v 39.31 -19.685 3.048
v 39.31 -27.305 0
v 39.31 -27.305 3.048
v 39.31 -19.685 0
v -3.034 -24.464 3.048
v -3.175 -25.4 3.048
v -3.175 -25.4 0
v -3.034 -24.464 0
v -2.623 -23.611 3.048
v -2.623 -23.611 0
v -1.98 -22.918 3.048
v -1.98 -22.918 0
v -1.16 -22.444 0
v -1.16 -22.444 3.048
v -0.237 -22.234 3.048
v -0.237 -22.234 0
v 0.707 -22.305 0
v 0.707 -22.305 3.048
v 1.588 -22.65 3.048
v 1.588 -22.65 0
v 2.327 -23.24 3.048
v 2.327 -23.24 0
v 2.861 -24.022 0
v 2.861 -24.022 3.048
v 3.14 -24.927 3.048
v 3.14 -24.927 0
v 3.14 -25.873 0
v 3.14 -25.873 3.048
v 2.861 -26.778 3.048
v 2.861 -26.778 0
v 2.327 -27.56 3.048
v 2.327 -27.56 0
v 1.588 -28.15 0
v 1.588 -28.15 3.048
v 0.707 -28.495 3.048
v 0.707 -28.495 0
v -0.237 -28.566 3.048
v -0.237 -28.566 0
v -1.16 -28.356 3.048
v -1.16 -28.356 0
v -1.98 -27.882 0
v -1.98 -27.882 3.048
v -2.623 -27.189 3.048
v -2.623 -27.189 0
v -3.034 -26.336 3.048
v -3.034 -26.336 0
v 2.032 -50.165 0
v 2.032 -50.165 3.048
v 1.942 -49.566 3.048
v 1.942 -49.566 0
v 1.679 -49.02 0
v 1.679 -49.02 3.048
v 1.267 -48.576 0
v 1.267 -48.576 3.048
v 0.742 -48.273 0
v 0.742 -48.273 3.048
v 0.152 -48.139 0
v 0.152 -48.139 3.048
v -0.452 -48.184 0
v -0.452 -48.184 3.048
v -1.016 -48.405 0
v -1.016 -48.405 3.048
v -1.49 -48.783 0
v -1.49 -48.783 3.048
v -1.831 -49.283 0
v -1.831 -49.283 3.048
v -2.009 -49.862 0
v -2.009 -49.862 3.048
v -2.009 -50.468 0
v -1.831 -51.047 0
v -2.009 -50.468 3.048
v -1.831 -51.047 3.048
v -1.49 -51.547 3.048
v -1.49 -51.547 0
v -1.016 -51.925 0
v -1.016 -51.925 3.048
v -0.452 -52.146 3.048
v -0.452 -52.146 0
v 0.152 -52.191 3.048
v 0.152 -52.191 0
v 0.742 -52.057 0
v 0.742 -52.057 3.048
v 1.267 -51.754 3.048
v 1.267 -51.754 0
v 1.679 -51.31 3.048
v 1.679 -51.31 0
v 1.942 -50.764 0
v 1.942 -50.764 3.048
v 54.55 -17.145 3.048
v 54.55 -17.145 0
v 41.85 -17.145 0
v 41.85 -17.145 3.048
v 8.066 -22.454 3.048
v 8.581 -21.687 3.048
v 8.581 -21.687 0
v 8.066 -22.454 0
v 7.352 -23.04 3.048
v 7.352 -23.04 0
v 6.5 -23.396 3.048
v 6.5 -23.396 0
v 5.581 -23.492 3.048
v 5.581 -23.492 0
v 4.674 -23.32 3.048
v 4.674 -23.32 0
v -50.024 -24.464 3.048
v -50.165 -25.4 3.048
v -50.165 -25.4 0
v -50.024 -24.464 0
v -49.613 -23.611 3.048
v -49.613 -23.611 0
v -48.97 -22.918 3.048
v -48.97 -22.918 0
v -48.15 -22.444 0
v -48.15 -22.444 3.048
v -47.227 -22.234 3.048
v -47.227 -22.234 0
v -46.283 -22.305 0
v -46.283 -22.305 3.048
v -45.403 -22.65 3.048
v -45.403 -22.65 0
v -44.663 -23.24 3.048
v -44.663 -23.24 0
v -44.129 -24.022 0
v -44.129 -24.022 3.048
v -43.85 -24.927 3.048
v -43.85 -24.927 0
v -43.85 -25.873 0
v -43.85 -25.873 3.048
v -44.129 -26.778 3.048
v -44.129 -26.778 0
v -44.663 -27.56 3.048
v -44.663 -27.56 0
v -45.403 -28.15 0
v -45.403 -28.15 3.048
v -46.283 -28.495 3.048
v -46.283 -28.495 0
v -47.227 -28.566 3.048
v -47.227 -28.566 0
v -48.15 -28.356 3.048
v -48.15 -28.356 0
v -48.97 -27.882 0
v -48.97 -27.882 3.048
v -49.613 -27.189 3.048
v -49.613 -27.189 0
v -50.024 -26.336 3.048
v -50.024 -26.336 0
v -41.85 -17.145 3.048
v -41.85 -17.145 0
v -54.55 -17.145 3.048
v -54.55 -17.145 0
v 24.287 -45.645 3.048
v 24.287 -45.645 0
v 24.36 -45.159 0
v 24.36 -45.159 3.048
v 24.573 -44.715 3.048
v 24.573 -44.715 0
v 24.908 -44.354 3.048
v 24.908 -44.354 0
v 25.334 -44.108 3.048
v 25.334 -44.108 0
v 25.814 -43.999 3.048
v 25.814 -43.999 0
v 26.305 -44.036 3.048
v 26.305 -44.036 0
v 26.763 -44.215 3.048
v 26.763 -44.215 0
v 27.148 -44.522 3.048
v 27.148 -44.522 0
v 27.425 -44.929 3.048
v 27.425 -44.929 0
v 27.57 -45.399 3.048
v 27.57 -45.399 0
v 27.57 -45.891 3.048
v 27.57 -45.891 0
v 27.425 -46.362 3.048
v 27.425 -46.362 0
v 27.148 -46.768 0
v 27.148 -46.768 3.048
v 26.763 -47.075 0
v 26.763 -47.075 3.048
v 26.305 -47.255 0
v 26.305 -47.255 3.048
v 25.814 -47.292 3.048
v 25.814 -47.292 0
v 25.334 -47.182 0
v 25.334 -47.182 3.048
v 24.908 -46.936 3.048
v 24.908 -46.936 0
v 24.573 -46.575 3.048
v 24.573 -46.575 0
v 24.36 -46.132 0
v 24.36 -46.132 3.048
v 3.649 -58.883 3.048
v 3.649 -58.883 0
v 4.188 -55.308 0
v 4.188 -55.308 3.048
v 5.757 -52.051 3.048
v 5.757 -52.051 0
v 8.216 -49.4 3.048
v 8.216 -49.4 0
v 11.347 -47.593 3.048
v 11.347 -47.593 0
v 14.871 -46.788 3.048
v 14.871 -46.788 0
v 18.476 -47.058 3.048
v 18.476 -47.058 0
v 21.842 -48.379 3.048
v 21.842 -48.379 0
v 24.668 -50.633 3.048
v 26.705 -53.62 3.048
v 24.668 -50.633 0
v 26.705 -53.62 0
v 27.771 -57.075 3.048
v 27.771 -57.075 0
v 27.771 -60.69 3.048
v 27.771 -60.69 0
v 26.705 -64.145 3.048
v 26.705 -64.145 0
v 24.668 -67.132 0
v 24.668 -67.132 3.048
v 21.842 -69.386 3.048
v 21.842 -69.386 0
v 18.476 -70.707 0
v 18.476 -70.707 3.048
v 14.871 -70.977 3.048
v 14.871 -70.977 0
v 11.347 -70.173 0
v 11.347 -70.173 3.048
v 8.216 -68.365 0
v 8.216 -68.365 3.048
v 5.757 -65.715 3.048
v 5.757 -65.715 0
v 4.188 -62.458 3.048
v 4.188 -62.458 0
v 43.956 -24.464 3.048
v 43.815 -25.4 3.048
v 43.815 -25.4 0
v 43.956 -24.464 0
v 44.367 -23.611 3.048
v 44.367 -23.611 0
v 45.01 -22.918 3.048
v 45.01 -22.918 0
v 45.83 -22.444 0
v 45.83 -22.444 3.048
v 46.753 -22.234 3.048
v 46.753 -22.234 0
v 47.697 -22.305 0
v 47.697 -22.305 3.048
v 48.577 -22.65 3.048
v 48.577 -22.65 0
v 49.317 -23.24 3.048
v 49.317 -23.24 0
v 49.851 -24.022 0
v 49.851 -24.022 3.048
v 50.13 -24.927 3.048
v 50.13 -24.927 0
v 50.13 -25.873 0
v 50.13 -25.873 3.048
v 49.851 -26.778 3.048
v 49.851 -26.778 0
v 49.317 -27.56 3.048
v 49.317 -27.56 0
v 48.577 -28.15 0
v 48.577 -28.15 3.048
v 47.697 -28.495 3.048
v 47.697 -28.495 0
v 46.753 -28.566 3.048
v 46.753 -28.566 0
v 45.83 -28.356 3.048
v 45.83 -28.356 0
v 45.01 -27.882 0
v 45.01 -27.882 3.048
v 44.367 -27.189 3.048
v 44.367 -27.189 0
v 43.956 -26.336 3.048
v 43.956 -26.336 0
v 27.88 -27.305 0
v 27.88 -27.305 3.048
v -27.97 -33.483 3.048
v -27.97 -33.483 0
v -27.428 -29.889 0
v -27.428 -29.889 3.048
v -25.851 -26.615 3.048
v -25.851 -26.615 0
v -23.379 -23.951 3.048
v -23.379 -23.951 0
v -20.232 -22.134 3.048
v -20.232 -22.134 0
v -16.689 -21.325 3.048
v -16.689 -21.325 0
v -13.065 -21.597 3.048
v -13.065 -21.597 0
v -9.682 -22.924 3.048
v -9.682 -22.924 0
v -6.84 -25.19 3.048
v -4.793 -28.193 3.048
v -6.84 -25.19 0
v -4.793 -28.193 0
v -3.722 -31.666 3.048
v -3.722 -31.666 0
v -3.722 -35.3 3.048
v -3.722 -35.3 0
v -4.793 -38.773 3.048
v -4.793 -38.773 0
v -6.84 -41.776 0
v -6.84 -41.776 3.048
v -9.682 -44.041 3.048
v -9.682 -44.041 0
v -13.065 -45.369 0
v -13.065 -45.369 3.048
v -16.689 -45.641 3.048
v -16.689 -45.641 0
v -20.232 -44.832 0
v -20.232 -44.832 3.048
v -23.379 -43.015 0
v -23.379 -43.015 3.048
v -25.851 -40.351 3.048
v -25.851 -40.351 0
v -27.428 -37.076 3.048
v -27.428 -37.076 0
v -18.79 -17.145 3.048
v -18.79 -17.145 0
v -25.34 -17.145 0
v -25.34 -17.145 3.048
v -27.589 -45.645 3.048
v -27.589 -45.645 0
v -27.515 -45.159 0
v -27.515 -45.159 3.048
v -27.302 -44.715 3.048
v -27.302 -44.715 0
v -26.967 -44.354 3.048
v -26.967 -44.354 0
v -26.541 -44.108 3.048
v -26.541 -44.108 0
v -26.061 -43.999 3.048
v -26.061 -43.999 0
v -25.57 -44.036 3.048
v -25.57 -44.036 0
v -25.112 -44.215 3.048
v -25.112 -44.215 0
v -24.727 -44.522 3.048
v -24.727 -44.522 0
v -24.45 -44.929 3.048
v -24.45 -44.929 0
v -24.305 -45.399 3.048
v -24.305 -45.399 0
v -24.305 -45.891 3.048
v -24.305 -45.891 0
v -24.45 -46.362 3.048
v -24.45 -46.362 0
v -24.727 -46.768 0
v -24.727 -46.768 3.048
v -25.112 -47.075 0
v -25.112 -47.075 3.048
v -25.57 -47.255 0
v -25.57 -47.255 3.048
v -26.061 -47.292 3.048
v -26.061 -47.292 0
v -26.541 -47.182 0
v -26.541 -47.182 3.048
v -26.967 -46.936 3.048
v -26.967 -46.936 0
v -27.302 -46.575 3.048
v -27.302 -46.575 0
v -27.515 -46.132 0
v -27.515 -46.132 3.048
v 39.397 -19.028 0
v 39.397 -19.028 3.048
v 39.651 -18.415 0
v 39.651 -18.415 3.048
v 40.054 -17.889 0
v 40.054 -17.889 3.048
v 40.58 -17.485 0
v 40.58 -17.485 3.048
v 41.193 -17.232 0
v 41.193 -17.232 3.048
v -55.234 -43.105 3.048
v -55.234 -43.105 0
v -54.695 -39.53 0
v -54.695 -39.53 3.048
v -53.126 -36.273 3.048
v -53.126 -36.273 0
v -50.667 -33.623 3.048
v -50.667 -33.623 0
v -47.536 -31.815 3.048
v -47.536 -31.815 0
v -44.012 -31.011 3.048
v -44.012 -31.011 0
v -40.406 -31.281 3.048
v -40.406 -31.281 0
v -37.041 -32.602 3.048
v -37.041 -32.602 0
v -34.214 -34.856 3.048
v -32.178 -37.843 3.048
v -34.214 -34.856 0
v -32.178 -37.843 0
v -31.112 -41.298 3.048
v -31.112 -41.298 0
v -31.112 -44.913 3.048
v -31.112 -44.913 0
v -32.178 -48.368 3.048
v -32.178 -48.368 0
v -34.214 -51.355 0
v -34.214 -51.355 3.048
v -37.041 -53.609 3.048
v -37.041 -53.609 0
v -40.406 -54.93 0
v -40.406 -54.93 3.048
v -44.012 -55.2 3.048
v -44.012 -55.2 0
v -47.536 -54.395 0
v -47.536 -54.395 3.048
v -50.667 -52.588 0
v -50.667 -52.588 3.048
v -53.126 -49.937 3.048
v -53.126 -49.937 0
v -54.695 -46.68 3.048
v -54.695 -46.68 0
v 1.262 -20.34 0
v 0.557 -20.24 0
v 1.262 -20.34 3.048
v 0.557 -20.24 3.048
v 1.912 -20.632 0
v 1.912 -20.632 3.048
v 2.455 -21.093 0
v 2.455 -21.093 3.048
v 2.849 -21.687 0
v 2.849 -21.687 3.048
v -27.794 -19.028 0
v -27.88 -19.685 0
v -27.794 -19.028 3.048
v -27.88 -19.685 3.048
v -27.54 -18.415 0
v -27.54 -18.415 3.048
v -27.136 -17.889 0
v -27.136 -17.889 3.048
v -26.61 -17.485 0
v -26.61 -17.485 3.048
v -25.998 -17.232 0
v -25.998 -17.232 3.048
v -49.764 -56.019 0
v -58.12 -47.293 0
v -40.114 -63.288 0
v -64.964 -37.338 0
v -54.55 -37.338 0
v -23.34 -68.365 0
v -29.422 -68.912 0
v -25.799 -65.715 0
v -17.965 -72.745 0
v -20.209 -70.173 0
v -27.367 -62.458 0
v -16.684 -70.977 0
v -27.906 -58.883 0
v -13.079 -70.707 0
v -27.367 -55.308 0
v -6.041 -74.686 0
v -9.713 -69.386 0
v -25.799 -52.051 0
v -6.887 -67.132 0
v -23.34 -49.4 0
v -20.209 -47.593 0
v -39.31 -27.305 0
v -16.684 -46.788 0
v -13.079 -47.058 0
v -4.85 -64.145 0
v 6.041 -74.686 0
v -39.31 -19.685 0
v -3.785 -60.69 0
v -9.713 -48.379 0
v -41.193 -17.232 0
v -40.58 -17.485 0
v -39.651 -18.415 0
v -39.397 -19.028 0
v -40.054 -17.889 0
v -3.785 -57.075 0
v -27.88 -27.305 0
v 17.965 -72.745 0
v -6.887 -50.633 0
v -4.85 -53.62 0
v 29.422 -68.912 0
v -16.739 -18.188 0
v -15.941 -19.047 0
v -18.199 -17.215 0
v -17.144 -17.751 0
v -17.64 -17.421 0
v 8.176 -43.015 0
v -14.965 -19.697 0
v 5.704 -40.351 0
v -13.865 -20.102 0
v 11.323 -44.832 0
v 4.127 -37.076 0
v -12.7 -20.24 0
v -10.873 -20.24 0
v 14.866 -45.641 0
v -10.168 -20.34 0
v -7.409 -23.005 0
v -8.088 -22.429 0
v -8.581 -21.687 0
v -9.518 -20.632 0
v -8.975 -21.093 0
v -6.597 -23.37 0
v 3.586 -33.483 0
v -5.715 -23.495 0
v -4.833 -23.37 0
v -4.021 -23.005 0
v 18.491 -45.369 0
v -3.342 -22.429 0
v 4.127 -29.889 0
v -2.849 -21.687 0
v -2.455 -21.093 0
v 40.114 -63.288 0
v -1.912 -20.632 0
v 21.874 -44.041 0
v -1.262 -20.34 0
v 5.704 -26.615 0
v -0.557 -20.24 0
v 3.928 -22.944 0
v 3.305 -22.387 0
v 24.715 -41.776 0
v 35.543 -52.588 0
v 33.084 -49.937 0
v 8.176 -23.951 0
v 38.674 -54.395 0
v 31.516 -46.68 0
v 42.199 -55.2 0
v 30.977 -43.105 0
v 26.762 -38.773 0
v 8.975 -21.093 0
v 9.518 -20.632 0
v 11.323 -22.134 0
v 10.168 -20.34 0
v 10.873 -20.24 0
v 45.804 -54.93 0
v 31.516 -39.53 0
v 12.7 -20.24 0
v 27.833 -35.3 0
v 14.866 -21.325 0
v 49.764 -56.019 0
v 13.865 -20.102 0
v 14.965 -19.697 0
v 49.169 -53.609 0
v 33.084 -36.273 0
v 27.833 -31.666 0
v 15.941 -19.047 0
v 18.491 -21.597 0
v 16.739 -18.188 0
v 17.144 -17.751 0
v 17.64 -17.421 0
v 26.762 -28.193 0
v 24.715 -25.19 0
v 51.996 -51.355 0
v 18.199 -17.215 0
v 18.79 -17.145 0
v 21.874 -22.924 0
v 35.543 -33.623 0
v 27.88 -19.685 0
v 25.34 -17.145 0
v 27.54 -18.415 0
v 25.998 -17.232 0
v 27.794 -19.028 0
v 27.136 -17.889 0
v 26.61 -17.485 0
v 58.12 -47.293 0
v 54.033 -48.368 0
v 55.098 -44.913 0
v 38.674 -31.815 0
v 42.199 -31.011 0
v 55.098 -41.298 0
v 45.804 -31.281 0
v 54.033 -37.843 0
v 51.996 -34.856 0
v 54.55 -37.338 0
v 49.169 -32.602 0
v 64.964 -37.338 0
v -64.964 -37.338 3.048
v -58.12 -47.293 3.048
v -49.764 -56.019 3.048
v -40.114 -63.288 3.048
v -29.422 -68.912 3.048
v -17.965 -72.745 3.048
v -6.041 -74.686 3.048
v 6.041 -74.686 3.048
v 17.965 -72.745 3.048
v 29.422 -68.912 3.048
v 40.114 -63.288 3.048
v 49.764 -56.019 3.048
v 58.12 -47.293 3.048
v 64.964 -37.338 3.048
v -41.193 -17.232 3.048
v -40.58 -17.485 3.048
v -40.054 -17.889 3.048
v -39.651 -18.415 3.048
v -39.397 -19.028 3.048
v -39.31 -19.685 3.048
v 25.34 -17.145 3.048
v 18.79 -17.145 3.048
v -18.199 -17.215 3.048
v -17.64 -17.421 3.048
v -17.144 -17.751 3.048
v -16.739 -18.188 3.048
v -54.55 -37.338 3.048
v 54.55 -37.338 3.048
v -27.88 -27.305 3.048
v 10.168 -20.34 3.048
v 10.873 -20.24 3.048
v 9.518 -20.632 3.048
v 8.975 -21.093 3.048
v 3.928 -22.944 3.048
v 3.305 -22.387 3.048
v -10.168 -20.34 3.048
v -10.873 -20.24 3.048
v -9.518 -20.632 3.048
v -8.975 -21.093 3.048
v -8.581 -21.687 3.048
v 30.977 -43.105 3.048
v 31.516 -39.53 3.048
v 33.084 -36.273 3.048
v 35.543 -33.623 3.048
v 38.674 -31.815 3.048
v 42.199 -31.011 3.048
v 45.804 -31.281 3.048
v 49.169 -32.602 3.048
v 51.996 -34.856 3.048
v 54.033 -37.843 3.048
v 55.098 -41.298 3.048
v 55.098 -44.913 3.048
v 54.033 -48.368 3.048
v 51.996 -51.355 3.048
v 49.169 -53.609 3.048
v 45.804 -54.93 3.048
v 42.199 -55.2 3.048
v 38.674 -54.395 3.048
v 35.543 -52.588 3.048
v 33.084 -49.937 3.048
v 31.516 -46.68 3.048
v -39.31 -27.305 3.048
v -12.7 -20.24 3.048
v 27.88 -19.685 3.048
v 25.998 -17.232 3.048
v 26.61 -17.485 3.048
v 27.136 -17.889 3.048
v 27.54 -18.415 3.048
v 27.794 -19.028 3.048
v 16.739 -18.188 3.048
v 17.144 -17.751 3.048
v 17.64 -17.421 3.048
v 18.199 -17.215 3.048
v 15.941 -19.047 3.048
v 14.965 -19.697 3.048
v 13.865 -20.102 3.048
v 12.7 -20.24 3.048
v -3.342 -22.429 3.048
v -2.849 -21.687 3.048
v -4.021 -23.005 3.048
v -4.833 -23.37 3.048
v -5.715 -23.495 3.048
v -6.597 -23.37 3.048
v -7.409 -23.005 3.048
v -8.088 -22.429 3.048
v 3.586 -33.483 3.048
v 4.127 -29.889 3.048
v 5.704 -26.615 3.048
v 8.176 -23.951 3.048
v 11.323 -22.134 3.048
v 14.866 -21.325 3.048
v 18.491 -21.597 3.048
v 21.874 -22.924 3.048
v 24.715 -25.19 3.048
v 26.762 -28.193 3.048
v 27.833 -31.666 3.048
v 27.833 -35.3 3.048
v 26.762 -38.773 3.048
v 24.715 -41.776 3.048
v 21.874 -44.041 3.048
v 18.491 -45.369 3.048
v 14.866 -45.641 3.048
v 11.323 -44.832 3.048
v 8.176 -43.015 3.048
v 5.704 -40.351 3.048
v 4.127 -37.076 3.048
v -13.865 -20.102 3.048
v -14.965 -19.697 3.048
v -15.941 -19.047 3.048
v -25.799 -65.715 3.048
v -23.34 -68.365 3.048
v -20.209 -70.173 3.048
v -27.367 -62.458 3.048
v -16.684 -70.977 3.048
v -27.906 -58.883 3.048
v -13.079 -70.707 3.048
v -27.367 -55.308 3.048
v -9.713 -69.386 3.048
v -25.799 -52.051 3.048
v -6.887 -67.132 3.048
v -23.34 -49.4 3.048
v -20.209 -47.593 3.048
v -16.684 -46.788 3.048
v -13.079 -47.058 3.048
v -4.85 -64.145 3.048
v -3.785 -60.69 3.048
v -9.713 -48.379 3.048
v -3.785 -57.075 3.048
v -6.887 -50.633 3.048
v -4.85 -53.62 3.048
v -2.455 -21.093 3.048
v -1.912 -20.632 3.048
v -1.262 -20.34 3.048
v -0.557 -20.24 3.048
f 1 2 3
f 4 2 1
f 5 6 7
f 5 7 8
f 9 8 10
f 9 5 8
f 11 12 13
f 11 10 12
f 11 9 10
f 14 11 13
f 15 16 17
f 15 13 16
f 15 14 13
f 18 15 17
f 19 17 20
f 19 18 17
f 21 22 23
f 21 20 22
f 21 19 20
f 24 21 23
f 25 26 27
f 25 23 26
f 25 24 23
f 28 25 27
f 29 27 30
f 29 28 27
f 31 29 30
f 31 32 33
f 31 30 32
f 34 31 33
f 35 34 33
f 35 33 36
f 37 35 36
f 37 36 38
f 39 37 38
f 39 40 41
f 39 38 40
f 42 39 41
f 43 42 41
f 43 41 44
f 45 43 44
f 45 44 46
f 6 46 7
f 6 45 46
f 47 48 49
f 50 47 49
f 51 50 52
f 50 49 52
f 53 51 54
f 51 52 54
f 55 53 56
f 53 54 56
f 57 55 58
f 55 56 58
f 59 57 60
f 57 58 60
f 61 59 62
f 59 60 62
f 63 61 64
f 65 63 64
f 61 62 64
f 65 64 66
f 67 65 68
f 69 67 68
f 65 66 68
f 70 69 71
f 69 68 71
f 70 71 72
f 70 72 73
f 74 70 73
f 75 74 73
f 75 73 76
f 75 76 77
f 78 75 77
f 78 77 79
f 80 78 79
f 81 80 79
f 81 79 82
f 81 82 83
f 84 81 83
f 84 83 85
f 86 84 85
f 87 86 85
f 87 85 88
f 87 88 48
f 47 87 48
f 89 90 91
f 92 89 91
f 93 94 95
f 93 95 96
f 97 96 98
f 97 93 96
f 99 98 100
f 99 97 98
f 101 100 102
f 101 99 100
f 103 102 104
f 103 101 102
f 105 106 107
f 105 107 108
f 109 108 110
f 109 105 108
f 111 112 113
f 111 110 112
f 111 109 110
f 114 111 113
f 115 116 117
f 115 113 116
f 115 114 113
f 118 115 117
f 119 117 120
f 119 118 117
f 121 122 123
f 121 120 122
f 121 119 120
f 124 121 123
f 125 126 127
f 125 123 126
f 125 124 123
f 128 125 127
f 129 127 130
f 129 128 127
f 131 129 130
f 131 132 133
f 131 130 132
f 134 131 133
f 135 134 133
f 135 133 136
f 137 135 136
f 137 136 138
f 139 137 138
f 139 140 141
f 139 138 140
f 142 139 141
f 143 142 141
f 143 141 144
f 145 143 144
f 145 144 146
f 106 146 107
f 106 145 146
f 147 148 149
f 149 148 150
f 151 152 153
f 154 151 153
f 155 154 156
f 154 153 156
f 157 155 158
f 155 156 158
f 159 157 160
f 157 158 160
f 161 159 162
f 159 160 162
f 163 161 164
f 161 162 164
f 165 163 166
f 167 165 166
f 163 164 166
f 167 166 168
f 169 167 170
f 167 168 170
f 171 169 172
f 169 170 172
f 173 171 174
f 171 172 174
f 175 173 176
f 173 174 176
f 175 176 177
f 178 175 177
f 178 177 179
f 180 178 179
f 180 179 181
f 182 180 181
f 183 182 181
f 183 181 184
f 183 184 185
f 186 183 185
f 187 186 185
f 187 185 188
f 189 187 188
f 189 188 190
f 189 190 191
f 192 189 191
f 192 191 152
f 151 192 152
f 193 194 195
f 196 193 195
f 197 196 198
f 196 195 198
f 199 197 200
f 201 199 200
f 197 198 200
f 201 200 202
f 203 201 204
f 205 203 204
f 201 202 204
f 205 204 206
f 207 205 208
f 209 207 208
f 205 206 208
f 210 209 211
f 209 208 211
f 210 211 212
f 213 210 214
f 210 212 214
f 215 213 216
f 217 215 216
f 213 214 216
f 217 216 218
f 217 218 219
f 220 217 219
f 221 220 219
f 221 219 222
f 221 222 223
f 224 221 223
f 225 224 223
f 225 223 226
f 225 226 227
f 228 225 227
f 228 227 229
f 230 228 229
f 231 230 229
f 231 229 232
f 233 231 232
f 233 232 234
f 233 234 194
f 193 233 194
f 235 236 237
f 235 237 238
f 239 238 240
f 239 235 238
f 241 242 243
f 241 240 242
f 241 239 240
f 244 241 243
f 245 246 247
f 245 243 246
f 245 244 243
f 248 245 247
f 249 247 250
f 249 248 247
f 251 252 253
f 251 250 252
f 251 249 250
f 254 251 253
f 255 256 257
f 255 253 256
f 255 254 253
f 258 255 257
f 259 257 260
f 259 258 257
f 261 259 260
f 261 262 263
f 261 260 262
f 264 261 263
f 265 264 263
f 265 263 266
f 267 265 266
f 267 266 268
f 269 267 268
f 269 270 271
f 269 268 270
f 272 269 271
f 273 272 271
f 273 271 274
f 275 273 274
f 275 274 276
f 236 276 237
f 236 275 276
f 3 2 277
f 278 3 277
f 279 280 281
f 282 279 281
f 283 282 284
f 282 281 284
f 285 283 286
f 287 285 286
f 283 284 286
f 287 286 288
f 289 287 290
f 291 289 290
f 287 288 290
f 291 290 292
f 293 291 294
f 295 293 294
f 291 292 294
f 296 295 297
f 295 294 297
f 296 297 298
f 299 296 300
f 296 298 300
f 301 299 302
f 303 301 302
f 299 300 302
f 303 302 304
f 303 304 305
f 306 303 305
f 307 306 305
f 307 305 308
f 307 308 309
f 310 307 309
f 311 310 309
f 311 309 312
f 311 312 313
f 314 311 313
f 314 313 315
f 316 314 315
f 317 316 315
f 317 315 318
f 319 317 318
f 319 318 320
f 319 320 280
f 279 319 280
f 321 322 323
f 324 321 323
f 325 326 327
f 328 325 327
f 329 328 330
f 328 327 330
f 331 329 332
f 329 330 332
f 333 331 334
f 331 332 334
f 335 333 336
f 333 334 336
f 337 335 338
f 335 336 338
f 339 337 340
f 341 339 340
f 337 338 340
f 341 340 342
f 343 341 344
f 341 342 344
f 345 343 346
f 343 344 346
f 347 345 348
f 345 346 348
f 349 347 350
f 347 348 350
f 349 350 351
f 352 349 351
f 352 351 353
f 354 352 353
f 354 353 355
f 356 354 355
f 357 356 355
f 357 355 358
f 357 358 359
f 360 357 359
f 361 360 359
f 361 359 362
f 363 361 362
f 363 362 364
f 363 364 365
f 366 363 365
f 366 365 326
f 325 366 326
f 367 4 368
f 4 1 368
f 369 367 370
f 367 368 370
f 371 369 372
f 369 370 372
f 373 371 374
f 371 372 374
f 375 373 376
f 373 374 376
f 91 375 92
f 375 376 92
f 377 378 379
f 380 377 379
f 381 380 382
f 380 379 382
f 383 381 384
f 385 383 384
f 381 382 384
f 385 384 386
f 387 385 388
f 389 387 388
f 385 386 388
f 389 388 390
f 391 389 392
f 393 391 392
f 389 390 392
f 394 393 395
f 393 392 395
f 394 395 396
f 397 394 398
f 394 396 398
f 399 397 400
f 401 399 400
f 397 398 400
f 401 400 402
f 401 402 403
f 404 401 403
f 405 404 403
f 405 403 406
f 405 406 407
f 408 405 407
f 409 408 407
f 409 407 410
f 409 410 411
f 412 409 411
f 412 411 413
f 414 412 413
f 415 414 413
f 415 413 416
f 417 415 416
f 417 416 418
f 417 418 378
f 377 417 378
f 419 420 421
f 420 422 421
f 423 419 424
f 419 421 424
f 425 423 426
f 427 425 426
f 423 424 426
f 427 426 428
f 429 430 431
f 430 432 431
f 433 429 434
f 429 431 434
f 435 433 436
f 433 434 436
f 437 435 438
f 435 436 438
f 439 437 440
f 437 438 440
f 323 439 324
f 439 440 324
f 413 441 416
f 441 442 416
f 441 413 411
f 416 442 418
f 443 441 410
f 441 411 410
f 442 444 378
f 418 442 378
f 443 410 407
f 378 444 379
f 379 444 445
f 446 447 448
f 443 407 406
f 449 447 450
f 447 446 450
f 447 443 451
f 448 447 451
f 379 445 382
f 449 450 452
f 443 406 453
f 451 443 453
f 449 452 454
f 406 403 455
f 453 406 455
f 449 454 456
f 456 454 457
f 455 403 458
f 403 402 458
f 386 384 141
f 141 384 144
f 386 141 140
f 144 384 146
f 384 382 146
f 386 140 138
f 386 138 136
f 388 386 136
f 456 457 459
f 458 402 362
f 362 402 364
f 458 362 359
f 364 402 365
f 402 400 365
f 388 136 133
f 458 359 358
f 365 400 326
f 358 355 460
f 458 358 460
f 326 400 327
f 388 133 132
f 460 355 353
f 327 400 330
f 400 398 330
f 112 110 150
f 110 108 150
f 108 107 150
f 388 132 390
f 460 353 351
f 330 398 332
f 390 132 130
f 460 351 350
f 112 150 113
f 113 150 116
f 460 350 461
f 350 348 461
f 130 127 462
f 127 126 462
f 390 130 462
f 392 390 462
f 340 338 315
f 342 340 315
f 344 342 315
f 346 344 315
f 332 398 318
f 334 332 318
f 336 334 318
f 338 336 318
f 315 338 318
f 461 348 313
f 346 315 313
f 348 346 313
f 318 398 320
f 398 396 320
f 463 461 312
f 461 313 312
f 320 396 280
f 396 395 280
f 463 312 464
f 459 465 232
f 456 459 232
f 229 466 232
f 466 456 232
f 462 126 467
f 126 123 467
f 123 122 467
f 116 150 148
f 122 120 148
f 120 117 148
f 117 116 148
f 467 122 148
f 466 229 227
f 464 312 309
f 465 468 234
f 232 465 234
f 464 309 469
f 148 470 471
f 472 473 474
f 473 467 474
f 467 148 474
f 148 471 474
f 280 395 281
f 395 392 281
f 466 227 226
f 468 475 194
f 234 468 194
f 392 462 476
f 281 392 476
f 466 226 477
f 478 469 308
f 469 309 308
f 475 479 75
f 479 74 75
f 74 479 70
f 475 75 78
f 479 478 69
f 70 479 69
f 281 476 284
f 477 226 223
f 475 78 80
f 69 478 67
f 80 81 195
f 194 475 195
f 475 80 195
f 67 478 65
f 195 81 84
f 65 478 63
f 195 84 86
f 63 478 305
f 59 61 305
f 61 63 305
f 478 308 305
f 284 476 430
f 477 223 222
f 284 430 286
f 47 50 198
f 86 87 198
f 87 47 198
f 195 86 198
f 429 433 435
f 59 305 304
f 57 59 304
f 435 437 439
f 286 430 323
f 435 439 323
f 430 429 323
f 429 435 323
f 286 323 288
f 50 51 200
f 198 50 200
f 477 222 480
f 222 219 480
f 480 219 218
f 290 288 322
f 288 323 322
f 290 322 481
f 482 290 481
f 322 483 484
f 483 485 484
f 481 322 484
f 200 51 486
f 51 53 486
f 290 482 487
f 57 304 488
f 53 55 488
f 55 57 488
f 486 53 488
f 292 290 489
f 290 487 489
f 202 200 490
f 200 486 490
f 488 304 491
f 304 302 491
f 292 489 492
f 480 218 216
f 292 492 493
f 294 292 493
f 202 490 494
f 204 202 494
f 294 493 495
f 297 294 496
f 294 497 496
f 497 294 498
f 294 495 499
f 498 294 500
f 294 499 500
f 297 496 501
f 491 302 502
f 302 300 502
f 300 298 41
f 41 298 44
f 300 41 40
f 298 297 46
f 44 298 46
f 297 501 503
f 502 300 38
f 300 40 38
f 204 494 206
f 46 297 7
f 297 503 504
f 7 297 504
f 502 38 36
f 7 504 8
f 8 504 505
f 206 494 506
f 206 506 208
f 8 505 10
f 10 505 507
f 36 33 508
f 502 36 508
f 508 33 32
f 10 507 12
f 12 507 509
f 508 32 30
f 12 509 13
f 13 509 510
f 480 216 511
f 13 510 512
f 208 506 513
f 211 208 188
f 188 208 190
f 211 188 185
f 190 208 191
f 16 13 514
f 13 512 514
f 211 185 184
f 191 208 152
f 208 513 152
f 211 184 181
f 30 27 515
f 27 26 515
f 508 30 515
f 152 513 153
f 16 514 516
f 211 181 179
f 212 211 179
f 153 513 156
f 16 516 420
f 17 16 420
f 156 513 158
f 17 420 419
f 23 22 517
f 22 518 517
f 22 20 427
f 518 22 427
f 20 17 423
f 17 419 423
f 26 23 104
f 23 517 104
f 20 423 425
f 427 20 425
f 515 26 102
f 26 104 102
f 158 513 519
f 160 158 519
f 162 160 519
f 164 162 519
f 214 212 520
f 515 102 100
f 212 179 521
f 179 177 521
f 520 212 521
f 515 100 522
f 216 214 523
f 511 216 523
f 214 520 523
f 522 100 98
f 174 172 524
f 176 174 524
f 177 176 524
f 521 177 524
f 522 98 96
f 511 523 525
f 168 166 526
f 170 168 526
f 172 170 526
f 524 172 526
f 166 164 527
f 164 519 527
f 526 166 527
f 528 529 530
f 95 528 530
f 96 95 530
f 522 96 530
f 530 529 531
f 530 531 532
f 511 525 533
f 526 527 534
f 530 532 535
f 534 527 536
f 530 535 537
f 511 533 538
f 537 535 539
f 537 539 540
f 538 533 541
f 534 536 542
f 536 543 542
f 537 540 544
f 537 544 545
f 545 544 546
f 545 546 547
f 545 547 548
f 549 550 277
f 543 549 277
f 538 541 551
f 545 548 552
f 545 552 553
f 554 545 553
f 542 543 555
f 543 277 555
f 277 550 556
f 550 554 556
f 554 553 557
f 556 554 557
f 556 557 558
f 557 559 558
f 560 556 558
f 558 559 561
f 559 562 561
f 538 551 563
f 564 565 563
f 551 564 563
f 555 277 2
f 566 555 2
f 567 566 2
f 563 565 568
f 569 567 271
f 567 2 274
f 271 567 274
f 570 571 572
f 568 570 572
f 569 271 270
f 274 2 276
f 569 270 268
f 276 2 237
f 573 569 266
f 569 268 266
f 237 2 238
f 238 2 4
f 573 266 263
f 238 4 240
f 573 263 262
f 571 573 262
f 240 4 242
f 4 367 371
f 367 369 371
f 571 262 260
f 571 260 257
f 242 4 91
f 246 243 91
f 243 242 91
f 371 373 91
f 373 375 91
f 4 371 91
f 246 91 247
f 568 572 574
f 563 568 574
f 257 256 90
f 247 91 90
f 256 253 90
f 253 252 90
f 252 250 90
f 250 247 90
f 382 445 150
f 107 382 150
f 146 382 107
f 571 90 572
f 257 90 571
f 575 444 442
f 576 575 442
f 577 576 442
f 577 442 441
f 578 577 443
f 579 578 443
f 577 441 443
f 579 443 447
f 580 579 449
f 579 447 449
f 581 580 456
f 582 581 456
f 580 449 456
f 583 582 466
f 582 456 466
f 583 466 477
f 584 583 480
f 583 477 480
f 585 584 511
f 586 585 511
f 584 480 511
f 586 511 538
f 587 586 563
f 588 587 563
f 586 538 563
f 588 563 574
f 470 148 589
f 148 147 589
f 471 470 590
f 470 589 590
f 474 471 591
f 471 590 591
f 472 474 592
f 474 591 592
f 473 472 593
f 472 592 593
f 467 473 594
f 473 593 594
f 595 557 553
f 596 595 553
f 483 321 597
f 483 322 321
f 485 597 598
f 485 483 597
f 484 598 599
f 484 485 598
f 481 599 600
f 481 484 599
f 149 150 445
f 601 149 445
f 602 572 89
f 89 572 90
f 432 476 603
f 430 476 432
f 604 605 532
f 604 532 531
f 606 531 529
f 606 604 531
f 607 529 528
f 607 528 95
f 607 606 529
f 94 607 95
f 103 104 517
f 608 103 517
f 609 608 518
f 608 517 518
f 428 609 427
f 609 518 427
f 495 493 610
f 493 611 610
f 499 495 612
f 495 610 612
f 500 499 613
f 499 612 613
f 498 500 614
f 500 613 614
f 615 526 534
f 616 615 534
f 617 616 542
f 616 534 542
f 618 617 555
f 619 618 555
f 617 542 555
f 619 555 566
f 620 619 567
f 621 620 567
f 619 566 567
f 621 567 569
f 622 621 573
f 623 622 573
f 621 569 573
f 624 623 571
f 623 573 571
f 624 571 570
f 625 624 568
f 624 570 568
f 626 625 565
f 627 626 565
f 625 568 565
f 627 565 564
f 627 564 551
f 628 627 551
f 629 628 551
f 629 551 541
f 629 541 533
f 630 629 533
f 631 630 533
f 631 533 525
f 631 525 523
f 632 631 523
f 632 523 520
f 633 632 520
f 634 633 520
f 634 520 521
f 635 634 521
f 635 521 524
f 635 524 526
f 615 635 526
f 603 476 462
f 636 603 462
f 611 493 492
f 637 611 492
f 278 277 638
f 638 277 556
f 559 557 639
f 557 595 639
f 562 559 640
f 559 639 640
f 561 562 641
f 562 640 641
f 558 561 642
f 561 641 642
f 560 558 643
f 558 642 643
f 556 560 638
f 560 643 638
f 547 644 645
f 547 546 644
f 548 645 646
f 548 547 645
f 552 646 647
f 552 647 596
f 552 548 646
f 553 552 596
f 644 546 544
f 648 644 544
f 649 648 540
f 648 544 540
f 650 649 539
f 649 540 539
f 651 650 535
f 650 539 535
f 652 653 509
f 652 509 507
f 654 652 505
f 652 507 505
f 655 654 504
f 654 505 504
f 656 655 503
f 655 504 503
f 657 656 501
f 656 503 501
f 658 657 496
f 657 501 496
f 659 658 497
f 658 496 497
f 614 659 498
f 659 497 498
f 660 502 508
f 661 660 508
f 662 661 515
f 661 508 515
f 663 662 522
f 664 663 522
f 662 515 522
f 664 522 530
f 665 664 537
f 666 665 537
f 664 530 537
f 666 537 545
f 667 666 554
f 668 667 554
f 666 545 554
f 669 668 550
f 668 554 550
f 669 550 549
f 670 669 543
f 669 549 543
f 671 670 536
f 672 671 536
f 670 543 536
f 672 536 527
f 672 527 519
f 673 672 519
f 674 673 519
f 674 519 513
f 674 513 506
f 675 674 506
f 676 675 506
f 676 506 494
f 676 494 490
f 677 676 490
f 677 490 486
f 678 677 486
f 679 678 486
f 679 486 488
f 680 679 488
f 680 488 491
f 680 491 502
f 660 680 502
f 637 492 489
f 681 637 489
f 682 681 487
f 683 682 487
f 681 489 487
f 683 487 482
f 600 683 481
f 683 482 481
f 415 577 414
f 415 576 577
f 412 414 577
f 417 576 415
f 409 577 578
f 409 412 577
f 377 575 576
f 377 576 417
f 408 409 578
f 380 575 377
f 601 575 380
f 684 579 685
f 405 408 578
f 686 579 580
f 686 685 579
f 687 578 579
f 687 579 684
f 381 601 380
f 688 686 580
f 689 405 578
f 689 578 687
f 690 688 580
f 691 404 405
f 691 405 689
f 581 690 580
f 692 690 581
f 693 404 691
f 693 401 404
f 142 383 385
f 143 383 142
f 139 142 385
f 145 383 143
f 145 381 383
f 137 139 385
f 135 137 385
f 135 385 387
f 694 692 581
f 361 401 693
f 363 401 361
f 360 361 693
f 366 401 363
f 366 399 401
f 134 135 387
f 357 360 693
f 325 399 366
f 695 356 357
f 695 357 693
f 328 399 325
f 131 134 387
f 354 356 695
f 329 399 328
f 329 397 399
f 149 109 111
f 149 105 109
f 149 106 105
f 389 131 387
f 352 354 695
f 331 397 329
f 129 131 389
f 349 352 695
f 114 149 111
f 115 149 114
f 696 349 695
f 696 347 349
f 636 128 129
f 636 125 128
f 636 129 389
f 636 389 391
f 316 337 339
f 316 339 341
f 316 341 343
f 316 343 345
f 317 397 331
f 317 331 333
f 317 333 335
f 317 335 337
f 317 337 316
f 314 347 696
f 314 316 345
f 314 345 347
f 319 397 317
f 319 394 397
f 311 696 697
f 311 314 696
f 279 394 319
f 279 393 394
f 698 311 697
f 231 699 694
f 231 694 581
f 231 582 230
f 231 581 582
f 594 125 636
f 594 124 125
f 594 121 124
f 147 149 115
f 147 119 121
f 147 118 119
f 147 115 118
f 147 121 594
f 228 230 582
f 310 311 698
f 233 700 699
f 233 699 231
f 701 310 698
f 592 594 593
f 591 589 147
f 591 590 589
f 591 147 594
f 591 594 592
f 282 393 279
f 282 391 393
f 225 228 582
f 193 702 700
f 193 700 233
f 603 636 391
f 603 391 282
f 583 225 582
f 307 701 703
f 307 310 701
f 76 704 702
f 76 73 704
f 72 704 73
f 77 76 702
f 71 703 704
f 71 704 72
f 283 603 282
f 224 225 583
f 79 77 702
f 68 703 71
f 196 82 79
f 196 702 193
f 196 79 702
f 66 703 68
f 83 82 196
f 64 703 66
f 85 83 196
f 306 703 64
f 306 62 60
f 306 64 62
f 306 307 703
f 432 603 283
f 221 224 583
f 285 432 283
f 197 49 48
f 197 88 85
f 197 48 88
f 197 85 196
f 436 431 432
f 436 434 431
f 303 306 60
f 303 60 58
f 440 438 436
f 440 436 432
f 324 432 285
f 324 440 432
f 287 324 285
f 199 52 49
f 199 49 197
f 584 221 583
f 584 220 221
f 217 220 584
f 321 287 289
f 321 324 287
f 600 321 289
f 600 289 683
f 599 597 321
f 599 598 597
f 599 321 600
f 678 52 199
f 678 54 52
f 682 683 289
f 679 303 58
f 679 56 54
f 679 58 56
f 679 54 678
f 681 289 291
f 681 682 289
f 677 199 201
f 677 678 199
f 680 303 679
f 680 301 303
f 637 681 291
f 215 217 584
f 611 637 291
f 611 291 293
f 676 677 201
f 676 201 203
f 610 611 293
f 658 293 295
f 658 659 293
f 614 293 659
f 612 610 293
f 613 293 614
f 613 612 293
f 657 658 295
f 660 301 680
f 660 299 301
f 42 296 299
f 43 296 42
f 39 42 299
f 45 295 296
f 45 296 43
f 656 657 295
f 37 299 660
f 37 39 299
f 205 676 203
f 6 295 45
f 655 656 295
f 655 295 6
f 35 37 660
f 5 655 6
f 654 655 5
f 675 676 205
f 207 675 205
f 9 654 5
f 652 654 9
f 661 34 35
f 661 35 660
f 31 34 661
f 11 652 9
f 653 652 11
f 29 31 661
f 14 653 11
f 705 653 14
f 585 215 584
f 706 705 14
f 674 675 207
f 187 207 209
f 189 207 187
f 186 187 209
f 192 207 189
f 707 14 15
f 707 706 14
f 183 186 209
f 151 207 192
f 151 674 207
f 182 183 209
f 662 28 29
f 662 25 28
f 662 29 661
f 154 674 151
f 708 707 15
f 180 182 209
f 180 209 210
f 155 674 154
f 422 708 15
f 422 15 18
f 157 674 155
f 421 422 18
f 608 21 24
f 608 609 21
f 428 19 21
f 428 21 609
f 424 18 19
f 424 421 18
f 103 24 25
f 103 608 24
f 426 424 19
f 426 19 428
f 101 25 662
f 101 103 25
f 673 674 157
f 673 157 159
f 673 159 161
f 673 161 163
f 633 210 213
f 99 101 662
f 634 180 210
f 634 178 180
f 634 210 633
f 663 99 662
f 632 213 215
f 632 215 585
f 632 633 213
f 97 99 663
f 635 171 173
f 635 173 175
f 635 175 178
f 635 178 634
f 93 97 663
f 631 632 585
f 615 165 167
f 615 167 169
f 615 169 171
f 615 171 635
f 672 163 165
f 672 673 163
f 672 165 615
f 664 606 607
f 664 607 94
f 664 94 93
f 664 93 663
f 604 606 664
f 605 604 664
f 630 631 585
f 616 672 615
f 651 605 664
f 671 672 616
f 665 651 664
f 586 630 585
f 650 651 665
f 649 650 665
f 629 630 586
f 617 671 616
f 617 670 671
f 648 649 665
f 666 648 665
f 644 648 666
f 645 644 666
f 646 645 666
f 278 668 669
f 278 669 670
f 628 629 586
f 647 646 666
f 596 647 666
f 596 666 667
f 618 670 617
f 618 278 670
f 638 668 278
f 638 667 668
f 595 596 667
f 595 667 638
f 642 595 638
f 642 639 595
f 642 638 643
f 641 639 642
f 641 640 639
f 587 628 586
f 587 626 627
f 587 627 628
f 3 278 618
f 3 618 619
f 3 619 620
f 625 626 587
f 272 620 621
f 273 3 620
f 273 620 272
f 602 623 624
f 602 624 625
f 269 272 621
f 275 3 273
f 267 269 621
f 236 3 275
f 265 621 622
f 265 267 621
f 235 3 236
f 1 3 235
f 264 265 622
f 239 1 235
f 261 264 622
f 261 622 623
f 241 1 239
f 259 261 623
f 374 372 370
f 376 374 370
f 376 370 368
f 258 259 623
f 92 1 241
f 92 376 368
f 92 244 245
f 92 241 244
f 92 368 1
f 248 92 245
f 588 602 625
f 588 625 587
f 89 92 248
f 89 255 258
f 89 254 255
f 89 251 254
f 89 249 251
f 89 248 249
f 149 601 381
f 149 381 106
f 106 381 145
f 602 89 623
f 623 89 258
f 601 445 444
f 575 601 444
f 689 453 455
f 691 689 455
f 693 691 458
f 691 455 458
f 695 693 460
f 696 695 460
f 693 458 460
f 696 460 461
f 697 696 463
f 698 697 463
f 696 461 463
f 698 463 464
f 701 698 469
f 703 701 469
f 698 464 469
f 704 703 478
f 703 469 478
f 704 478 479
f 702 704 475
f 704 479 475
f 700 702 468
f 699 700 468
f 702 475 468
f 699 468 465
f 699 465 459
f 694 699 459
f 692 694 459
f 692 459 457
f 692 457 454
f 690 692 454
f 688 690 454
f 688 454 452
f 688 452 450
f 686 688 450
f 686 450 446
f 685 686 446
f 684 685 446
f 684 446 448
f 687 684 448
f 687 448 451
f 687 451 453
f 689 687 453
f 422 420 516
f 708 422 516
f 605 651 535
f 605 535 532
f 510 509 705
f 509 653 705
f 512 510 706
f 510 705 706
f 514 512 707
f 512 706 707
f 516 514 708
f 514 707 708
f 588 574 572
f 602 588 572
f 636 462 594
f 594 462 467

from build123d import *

# Parameters (mm, degrees)
SKETCH1_R                 = 1.651
BOSS_EXTRUDE2_DEPTH       = 3.048
SKETCH2_R                 = 1.143
CUT_EXTRUDE1_DEPTH        = 4.048
SKETCH3_R                 = 12.1285
CUT_EXTRUDE2_DEPTH        = 4.048
SKETCH4_W                 = 28.562713242
SKETCH4_H                 = 11.677503754
BOSS_EXTRUDE3_DEPTH       = 3.048
SKETCH5_W                 = 216.7214489
SKETCH5_H                 = 130.569220634
CUT_EXTRUDE4_DEPTH        = 4.048
SKETCH6_W                 = 4.7625
SKETCH6_H                 = 27.432
CUT_EXTRUDE5_DEPTH        = 4.048
SKETCH10_W                = 11.43
SKETCH10_H                = 10.16
CUT_EXTRUDE9_DEPTH        = 4.048
FILLET1_R                 = 6
FILLET2_R                 = 6
SKETCH66_R                = 1.651
CUT_EXTRUDE65_DEPTH       = 97.79
SKETCH120_R               = 3.175
CUT_EXTRUDE119_DEPTH      = 103.378
CUT_EXTRUDE119_DEPTH_BACK = 48.768
CUT_EXTRUDE12_DEPTH       = 10
FILLET3_R                 = 2.54
BOSS_EXTRUDE4_DEPTH       = 3.048
SKETCH122_R               = 2.032
CUT_EXTRUDE120_DEPTH      = 27.305
SKETCH123_R               = 12.192
CUT_EXTRUDE121_DEPTH      = 19.05


with BuildPart() as part:
    # Sketch1 → Boss-Extrude2 (new body)
    with BuildSketch(Plane.XY):
        with BuildLine():
            Line((-64.964441474, 37.338), (-54.550441474, 37.338))
            Line((-54.550441474, 37.338), (-54.550441474, -37.338))
            Line((-54.550441474, -37.338), (-64.964441474, -37.338))
            ThreePointArc((-64.964441474, -37.338), (0, -74.93), (64.964441474, -37.338))
            Line((64.964441474, -37.338), (54.550441474, -37.338))
            Line((54.550441474, -37.338), (54.550441474, 37.338))
            Line((54.550441474, 37.338), (64.964441474, 37.338))
            ThreePointArc((64.964441474, 37.338), (0, 74.93), (-64.964441474, 37.338))
        make_face()
        with Locations((-46.482, 11.049)):
            Circle(SKETCH1_R, mode=Mode.SUBTRACT)
        with Locations((-21.083270032, 10.795)):
            Circle(SKETCH1_R, mode=Mode.SUBTRACT)
        with Locations((-21.083270032, -10.795)):
            Circle(SKETCH1_R, mode=Mode.SUBTRACT)
        with Locations((-46.482, -11.049)):
            Circle(SKETCH1_R, mode=Mode.SUBTRACT)
        with Locations((46.482, -11.049)):
            Circle(SKETCH1_R, mode=Mode.SUBTRACT)
        with Locations((21.083270032, -10.795)):
            Circle(SKETCH1_R, mode=Mode.SUBTRACT)
        with Locations((21.083270032, 10.795)):
            Circle(SKETCH1_R, mode=Mode.SUBTRACT)
        with Locations((46.482, 11.049)):
            Circle(SKETCH1_R, mode=Mode.SUBTRACT)
    extrude(amount=BOSS_EXTRUDE2_DEPTH)

    # Sketch2 → Cut-Extrude1 (cut, through all)
    with BuildSketch(Plane.XY.offset(3.048)):
        with Locations((-6.731, 62.23)):
            Circle(SKETCH2_R)
        with Locations((6.731, 62.23)):
            Circle(SKETCH2_R)
    extrude(amount=-CUT_EXTRUDE1_DEPTH, mode=Mode.SUBTRACT)

    # Sketch3 → Cut-Extrude2 (cut, through all)
    with BuildSketch(Plane(origin=(0, 0, 0), x_dir=(-1, 0, 0), z_dir=(0, 0, -1))):
        with Locations((-15.777608989, -58.882838371)):
            Circle(SKETCH3_R)
        with Locations((15.777608989, -58.882838371)):
            Circle(SKETCH3_R)
        with Locations((-43.105229381, -43.105229381)):
            Circle(SKETCH3_R)
        with Locations((19.05, 32.995567884)):
            Circle(SKETCH3_R)
        with Locations((-43.105229381, 43.105229381)):
            Circle(SKETCH3_R)
        with Locations((43.105229381, 43.105229381)):
            Circle(SKETCH3_R)
        with Locations((-19.05, 32.995567884)):
            Circle(SKETCH3_R)
        with Locations((43.105229381, -43.105229381)):
            Circle(SKETCH3_R)
    extrude(amount=-CUT_EXTRUDE2_DEPTH, mode=Mode.SUBTRACT)

    # Sketch4 → Boss-Extrude3 (add)
    with BuildSketch(Plane(origin=(0, 0, 0), x_dir=(-1, 0, 0), z_dir=(0, 0, -1))):
        with Locations((-1.488809975, 62.152540216)):
            Rectangle(SKETCH4_W, SKETCH4_H)
    extrude(amount=-BOSS_EXTRUDE3_DEPTH)

    # Sketch5 → Cut-Extrude4 (cut, through all)
    with BuildSketch(Plane(origin=(0, 0, 0), x_dir=(-1, 0, 0), z_dir=(0, 0, -1))):
        with Locations((23.316688373, 48.139610317)):
            Rectangle(SKETCH5_W, SKETCH5_H)
    extrude(amount=-CUT_EXTRUDE4_DEPTH, mode=Mode.SUBTRACT)

    # Sketch6 → Cut-Extrude5 (cut, through all)
    with BuildSketch(Plane(origin=(0, 0, 0), x_dir=(-1, 0, 0), z_dir=(0, 0, -1))):
        with Locations((0, -45.847)):
            Rectangle(SKETCH6_W, SKETCH6_H)
        Polygon((-2.38125, -34.131), (-2.38125, -32.131), (-6.38125, -32.131), (-6.38125, -17.145), (-9.38125, -17.145), (-9.38125, -34.131), align=None)
    extrude(amount=-CUT_EXTRUDE5_DEPTH, mode=Mode.SUBTRACT)

    # Sketch10 → Cut-Extrude9 (cut, through all)
    with BuildSketch(Plane(origin=(0, 0, 0), x_dir=(-1, 0, 0), z_dir=(0, 0, -1))):
        with Locations((-33.595441474, -22.225)):
            Rectangle(SKETCH10_W, SKETCH10_H)
        with Locations((33.595441474, -22.225)):
            Rectangle(SKETCH10_W, SKETCH10_H)
    extrude(amount=-CUT_EXTRUDE9_DEPTH, mode=Mode.SUBTRACT)

    # Fillet1
    fillet1_edges = [part.edges().sort_by_distance(p)[0] for p in [
        (6.38125, -32.131, 1.524),
    ]]
    fillet(fillet1_edges, radius=FILLET1_R)

    # Fillet2
    fillet2_edges = [part.edges().sort_by_distance(p)[0] for p in [
        (2.38125, -34.131, 1.524),
    ]]
    fillet(fillet2_edges, radius=FILLET2_R)

    # Sketch66 → Cut-Extrude65 (cut)
    with BuildSketch(Plane(origin=(30.092005081, 4.08352975, -16.1925), x_dir=(-1, 0, 0), z_dir=(0, 0, -1))):
        with Locations((4.154396091, -49.728759131)):
            Circle(SKETCH66_R)
        with Locations((56.02961407, -49.728759131)):
            Circle(SKETCH66_R)
    extrude(amount=-CUT_EXTRUDE65_DEPTH, mode=Mode.SUBTRACT)

    # Sketch120 → Cut-Extrude119 (cut, two sides)
    with BuildSketch(Plane(origin=(30.092005081, 4.08352975, 19.939), x_dir=(-1, 0, 0), z_dir=(0, 0, -1))) as cut_extrude119_sk:
        with Locations((77.082005081, -29.48352975)):
            Circle(SKETCH120_R)
        with Locations((30.092005081, -29.48352975)):
            Circle(SKETCH120_R)
        with Locations((-16.897994919, -29.48352975)):
            Circle(SKETCH120_R)
    extrude(amount=CUT_EXTRUDE119_DEPTH, mode=Mode.SUBTRACT)
    extrude(cut_extrude119_sk.sketch, amount=-CUT_EXTRUDE119_DEPTH_BACK, mode=Mode.SUBTRACT)

    # Sketch13 → Cut-Extrude12 (cut)
    with BuildSketch(Plane(origin=(0, 0, 0), x_dir=(-1, 0, 0), z_dir=(0, 0, -1))):
        with BuildLine():
            Line((-12.7, -20.24), (-8.888991966, -20.24))
            ThreePointArc((-8.888991966, -20.24), (-5.715, -23.495), (-2.541008034, -20.24))
            Line((-2.541008034, -20.24), (2.541008034, -20.24))
            ThreePointArc((2.541008034, -20.24), (5.715, -23.495), (8.888991966, -20.24))
            Line((8.888991966, -20.24), (12.7, -20.24))
            ThreePointArc((12.7, -20.24), (16.235533906, -11.704466094), (7.7, -15.24))
            Line((7.7, -15.24), (-1.0625, -15.24))
            ThreePointArc((-1.0625, -15.24), (-4.012347567, -10.679640913), (-9.38125, -11.500227489))
            ThreePointArc((-9.38125, -11.500227489), (-17.374337523, -13.465015853), (-12.7, -20.24))
        make_face()
    extrude(amount=-CUT_EXTRUDE12_DEPTH, mode=Mode.SUBTRACT)

    # Fillet3
    fillet3_edges = [part.edges().sort_by_distance(p)[0] for p in [
        (39.310441474, -17.145, 1.524),
        (27.880441474, -17.145, 1.524),
        (-27.880441474, -17.145, 1.524),
        (-39.310441474, -17.145, 1.524),
        (6.38125, -23.424309253, 1.524),
        (9.38125, -20.24, 1.524),
        (17.322875188, -17.145, 1.524),
        (-17.322875188, -17.145, 1.524),
        (-8.888991966, -20.24, 1.524),
        (-2.541008034, -20.24, 1.524),
        (2.541008034, -20.24, 1.524),
    ]]
    fillet(fillet3_edges, radius=FILLET3_R)

    # Sketch121 → Boss-Extrude4 (add)
    with BuildSketch(Plane.XY.offset(3.048)):
        with BuildLine():
            Line((2.891074229, -60.515426156), (4.322679041, -42.124810499))
            Line((4.322679041, -42.124810499), (14.013542381, -30.56184856))
            Line((14.013542381, -30.56184856), (14.76082601, -20.962128091))
            Line((14.76082601, -20.962128091), (16.738759609, -18.187612732))
            ThreePointArc((16.738759609, -18.187612732), (14.965164049, -19.697469218), (12.7, -20.24))
            Line((12.7, -20.24), (10.873451803, -20.24))
            ThreePointArc((10.873451803, -20.24), (9.5179937, -20.631900064), (8.580806557, -21.686666667))
            ThreePointArc((8.580806557, -21.686666667), (5.715, -23.495), (2.849193443, -21.686666667))
            Line((2.849193443, -21.686666667), (4.942864205, -26.845073773))
            Line((4.942864205, -26.845073773), (2.891074229, -29.631036754))
            Line((2.891074229, -29.631036754), (-4.156826382, -31.552959583))
            Line((-4.156826382, -31.552959583), (-2.945468464, -62.167277862))
            Line((-2.945468464, -62.167277862), (2.891074229, -60.515426156))
        make_face()
    extrude(amount=-BOSS_EXTRUDE4_DEPTH)

    # Sketch122 → Cut-Extrude120 (cut)
    with BuildSketch(Plane.XY.offset(3.048)):
        with Locations((0, -50.165)):
            Circle(SKETCH122_R)
    extrude(amount=-CUT_EXTRUDE120_DEPTH, mode=Mode.SUBTRACT)

    # Sketch123 → Cut-Extrude121 (cut)
    with BuildSketch(Plane(origin=(0, 0, 0), x_dir=(-1, 0, 0), z_dir=(0, 0, -1))):
        with Locations((-15.777608989, -33.482838371)):
            Circle(SKETCH123_R)
        with Locations((15.777608989, -33.482838371)):
            Circle(SKETCH123_R)
    extrude(amount=-CUT_EXTRUDE121_DEPTH, mode=Mode.SUBTRACT)


solid = part.part
